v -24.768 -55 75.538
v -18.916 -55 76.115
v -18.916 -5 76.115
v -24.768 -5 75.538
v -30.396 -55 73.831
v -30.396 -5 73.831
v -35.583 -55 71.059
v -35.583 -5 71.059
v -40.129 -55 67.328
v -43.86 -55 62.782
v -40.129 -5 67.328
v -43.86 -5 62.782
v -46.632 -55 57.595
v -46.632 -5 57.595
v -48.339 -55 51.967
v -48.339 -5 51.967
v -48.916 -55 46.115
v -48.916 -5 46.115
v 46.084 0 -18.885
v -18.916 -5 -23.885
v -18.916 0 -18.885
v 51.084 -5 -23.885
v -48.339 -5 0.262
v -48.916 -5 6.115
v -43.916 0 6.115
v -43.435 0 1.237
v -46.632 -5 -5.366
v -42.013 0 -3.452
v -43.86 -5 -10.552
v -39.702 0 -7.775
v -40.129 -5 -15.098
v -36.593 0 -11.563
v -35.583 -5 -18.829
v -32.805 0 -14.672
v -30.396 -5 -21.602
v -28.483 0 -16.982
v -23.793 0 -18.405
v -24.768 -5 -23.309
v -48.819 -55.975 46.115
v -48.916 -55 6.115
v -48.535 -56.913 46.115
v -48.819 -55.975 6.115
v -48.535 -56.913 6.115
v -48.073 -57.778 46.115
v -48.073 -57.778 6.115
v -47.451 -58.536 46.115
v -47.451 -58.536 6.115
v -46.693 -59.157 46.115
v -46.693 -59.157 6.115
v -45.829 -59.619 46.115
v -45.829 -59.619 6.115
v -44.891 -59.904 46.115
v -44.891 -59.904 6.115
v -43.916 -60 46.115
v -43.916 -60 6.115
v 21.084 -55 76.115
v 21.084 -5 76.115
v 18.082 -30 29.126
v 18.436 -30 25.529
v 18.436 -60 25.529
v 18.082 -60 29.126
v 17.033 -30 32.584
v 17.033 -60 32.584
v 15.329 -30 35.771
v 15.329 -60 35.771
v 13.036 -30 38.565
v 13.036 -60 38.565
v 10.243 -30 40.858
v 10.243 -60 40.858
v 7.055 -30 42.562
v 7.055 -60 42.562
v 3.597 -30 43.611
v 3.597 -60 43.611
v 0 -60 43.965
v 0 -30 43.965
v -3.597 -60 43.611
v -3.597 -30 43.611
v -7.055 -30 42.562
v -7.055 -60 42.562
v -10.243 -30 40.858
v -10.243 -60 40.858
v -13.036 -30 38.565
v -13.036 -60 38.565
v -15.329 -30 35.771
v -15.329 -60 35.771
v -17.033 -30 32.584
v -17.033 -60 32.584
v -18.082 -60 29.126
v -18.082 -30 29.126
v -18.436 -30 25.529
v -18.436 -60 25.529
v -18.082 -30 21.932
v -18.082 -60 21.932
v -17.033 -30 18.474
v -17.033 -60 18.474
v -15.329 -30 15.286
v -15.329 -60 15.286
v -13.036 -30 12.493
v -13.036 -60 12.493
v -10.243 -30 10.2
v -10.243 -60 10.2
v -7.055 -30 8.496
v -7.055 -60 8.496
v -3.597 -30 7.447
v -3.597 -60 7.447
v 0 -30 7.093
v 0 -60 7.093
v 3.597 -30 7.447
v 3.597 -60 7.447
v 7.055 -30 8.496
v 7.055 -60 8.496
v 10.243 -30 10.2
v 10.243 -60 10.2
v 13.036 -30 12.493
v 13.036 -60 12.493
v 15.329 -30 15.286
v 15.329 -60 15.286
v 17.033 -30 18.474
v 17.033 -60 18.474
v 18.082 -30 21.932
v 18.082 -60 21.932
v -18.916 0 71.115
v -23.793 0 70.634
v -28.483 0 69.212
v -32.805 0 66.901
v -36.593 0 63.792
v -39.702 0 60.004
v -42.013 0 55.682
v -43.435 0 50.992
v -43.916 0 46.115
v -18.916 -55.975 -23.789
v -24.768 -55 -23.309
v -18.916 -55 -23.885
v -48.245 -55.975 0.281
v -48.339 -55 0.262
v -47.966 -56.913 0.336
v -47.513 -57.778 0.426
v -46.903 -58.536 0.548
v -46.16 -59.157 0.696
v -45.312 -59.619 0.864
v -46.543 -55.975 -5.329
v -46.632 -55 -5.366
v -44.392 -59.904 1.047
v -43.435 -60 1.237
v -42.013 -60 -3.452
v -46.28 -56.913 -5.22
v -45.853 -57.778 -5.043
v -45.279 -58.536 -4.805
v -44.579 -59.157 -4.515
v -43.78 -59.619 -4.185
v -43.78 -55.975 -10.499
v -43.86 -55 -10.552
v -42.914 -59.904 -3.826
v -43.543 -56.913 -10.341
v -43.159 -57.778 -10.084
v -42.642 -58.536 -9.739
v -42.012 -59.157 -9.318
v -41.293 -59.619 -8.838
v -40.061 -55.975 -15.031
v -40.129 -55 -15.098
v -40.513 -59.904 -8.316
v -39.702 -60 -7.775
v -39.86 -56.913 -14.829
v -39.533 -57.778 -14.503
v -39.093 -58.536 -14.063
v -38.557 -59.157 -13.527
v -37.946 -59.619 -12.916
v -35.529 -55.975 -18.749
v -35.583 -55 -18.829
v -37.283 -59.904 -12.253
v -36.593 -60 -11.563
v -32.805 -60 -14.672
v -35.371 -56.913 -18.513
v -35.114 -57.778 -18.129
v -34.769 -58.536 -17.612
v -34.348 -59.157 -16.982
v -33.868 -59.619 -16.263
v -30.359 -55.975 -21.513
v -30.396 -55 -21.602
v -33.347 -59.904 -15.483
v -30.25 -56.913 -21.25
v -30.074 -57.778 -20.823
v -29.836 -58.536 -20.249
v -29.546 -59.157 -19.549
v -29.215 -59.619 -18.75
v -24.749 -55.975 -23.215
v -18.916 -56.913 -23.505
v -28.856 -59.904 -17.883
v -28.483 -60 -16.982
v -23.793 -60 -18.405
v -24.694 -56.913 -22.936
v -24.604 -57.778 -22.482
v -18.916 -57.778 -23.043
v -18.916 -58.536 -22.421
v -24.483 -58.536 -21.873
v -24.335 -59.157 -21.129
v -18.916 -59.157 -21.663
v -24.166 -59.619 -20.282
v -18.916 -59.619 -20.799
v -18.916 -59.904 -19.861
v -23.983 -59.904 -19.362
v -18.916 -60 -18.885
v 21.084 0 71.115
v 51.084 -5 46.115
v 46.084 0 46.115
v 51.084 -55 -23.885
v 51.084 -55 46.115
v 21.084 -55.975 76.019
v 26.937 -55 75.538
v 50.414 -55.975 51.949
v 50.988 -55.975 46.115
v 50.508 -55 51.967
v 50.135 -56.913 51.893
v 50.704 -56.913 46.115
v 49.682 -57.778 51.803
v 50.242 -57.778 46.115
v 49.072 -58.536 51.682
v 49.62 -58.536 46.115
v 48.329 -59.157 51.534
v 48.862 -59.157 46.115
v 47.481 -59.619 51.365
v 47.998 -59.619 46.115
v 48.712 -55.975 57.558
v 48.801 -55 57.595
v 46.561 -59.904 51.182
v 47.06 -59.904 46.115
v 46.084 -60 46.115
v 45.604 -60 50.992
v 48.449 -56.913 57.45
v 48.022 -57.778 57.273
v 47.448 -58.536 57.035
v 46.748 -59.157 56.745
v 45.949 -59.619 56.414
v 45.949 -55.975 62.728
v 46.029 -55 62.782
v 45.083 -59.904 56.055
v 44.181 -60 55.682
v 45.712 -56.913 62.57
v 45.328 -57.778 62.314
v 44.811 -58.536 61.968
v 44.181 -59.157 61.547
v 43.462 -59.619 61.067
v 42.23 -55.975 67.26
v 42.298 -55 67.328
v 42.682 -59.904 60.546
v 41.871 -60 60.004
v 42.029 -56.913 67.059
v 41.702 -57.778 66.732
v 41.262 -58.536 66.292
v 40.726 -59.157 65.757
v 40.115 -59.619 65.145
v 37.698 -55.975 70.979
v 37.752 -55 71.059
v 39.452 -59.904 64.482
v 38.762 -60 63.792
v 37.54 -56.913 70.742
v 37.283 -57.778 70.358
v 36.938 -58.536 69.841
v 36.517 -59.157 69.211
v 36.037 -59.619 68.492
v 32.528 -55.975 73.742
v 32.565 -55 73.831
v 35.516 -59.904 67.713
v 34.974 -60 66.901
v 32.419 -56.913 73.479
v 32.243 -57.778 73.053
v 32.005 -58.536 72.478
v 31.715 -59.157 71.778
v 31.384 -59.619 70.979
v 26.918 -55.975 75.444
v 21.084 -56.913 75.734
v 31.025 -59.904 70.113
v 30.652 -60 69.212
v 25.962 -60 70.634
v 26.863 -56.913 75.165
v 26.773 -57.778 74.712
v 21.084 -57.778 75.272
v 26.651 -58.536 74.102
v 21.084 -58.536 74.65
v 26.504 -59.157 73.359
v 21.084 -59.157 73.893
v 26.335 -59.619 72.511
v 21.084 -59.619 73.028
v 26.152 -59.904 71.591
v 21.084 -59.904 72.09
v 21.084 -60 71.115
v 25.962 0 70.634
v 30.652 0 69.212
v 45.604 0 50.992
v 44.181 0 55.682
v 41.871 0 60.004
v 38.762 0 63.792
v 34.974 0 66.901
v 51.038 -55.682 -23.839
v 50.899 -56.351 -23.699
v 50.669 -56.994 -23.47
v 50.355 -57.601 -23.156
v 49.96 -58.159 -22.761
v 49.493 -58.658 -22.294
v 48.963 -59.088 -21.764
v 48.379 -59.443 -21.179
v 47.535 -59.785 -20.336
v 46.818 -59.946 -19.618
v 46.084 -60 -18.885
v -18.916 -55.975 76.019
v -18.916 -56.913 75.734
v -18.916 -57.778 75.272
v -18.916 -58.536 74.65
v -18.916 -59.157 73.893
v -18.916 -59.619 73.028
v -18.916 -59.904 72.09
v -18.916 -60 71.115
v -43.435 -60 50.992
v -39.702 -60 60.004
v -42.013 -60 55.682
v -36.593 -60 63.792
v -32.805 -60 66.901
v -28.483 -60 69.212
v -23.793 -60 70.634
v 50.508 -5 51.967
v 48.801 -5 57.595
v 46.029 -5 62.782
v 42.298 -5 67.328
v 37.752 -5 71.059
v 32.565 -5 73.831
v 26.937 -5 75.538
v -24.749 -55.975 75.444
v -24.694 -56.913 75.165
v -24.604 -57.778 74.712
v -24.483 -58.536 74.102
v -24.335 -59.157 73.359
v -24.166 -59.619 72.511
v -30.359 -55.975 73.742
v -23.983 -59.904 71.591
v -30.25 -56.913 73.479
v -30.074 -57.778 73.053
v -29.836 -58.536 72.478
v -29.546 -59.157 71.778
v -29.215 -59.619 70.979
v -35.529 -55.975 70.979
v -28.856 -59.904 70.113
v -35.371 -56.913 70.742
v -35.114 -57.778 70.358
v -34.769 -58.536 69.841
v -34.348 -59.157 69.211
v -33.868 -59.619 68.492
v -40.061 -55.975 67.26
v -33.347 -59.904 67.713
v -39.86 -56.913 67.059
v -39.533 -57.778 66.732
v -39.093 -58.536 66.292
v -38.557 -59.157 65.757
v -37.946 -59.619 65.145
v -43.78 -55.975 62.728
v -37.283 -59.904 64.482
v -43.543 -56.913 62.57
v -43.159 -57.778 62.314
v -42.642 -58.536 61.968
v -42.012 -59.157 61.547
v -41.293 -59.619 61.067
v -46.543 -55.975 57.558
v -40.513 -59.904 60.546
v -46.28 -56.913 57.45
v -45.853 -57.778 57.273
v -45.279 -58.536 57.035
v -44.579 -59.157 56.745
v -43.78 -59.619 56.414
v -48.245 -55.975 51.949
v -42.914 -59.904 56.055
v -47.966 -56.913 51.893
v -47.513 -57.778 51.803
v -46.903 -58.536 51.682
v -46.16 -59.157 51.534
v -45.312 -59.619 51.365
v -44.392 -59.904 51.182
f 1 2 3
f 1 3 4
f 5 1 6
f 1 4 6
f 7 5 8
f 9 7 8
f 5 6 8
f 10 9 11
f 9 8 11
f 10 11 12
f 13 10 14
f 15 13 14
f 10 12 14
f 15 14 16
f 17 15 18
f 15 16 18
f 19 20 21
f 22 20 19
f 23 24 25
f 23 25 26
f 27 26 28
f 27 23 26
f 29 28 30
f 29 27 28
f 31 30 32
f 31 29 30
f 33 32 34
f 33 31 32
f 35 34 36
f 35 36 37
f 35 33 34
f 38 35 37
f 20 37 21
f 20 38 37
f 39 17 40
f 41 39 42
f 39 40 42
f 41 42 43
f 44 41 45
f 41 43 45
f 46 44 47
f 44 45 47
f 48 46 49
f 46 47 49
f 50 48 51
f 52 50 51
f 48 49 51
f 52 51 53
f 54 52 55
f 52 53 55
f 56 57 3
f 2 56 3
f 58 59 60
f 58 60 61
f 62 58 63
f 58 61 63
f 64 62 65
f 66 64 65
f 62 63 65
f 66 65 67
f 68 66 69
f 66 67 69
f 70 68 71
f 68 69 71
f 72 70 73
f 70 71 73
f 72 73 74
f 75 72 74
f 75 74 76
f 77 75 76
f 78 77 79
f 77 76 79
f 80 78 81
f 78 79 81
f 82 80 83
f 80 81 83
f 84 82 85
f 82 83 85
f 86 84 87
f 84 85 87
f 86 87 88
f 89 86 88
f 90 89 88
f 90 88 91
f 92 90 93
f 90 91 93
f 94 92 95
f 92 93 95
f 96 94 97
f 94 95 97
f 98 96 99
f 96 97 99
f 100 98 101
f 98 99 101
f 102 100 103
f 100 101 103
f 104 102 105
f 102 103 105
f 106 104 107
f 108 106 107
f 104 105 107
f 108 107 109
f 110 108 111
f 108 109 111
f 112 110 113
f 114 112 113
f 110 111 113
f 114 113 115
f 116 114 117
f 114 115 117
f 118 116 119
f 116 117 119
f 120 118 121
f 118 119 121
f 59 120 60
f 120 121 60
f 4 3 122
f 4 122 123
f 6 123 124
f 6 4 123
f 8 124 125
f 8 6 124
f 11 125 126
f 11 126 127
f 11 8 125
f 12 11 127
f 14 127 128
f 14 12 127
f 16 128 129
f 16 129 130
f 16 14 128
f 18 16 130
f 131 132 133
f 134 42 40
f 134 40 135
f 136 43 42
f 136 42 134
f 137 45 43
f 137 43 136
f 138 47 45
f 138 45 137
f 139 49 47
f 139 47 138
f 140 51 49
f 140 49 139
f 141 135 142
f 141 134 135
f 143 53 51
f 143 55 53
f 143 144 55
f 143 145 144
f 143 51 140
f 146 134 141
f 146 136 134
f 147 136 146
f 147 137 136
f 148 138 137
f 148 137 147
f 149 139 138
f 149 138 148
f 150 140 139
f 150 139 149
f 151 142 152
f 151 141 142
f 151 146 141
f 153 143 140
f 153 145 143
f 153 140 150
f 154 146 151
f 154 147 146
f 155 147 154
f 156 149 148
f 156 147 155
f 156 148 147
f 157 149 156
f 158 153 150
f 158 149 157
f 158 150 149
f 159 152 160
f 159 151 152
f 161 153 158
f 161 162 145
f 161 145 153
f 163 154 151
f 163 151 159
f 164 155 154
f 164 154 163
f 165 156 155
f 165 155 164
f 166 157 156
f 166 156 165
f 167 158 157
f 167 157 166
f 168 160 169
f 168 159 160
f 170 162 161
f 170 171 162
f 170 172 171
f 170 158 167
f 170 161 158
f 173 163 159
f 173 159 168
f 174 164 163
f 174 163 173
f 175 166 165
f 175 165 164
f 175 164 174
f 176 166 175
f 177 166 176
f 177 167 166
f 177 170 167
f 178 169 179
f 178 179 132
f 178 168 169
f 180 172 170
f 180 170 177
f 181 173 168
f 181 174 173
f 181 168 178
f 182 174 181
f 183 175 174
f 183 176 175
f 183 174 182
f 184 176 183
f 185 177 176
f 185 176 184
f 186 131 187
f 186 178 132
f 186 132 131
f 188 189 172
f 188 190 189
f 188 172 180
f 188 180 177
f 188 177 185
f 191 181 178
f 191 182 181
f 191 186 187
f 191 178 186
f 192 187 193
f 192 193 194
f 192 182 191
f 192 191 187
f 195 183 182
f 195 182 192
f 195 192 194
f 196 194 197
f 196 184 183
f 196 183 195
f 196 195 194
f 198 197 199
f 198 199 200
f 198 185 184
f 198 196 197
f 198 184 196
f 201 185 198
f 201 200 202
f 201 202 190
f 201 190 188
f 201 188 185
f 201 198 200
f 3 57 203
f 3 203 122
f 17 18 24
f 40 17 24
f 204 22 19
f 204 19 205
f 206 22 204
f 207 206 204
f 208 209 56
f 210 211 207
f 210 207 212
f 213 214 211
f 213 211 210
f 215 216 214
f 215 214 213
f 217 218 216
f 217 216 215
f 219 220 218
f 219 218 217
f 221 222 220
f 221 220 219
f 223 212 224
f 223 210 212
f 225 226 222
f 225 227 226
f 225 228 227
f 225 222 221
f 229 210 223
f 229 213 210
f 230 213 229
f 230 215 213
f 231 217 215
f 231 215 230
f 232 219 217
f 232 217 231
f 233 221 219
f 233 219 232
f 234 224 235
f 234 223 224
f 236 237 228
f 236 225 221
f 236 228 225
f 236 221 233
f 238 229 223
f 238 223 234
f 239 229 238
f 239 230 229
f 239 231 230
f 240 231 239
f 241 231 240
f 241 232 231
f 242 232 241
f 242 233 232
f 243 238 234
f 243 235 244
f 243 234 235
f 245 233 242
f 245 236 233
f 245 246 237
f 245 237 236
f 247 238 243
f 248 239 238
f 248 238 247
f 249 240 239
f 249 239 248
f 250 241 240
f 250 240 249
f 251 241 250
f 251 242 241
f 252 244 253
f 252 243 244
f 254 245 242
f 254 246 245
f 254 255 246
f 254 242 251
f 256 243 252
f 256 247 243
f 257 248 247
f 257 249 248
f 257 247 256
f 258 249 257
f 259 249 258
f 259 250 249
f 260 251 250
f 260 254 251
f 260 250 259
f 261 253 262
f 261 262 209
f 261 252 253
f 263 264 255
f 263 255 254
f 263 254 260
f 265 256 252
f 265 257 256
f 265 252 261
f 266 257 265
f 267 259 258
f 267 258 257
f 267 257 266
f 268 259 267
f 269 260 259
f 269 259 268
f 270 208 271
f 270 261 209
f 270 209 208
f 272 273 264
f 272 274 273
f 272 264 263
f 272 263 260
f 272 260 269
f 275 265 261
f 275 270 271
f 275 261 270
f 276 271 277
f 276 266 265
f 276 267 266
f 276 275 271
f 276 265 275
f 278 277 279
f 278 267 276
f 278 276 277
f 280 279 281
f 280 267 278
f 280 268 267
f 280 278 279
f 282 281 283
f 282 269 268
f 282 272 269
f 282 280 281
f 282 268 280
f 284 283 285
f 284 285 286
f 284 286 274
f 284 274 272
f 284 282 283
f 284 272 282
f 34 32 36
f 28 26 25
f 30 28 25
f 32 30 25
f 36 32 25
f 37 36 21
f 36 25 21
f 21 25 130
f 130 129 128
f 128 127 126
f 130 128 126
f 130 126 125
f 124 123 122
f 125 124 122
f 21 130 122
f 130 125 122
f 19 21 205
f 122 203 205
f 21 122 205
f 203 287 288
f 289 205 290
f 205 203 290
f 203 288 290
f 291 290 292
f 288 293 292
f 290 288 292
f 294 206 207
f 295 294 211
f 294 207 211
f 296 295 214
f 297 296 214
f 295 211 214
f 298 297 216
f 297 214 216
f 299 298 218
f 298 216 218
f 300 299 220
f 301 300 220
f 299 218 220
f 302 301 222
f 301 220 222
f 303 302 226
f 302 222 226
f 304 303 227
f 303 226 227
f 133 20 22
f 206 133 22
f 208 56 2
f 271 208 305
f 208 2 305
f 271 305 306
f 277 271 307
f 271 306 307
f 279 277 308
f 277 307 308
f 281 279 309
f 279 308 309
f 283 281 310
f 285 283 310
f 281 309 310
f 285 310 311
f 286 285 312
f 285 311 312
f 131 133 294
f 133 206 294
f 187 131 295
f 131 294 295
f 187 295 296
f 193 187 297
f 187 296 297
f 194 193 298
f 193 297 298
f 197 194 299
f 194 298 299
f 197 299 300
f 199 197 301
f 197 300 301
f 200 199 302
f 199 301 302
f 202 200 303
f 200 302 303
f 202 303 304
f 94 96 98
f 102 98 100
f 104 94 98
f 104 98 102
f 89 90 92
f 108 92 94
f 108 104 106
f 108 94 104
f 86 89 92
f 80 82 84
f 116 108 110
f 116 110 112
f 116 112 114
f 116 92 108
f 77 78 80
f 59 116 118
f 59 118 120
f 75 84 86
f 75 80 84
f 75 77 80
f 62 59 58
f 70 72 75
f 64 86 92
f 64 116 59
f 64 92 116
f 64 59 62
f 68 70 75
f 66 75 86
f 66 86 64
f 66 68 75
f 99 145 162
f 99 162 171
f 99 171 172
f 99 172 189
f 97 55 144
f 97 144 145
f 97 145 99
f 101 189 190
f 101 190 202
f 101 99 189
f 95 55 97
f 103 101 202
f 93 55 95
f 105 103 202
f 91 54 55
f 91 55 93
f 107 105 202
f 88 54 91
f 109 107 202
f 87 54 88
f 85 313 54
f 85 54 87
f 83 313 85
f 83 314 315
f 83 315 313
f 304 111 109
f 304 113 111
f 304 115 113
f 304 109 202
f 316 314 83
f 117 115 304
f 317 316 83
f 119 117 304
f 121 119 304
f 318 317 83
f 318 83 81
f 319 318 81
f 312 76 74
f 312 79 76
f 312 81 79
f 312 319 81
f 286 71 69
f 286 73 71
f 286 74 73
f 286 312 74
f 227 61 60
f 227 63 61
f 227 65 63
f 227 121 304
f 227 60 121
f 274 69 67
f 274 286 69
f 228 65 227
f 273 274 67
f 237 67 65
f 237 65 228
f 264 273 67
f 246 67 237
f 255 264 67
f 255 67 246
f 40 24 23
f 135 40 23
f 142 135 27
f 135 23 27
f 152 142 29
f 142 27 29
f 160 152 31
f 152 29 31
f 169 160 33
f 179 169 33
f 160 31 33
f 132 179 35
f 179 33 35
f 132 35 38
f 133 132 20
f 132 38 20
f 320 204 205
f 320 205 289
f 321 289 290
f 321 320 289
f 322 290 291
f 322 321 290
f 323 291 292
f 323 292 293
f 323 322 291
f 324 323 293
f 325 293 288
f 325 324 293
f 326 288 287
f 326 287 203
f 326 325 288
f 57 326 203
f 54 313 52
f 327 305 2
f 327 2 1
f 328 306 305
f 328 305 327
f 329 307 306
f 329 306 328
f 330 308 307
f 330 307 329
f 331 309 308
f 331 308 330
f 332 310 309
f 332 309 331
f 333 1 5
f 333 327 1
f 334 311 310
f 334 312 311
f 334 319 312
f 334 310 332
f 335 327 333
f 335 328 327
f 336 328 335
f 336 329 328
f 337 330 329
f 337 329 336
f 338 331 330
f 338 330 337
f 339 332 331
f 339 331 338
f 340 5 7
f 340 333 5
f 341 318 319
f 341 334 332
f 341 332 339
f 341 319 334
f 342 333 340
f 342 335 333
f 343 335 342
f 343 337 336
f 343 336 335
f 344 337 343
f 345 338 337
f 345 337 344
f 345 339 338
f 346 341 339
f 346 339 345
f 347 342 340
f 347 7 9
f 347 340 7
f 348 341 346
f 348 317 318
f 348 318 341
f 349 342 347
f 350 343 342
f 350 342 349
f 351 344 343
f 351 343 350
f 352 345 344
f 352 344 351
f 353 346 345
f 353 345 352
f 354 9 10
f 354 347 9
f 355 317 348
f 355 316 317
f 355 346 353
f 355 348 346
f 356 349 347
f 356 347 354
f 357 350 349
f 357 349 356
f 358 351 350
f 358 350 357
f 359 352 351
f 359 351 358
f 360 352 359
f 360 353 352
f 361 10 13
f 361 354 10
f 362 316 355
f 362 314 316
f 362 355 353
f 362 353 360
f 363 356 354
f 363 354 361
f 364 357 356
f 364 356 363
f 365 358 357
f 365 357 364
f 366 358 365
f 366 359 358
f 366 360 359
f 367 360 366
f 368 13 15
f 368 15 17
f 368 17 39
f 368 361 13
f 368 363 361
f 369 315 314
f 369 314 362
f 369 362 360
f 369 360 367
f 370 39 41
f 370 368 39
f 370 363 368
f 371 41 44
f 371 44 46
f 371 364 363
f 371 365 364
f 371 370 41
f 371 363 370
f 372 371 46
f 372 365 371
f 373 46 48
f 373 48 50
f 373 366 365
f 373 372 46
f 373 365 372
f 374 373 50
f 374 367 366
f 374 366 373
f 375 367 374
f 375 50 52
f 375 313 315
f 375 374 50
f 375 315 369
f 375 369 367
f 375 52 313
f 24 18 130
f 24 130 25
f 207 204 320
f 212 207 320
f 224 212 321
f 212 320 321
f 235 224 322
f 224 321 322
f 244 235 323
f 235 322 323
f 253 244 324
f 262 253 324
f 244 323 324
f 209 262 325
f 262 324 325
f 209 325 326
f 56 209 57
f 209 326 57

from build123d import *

# Parameters (mm, degrees)
F1_DEPTH = 60
F2_R     = 5
F3_SIZE  = 5
F4_R     = 18.436083
F5_DEPTH = 30


with BuildPart() as f1:
    # F0 (on Front) → F1 (new body)
    with BuildSketch(Plane.XZ):
        with BuildLine():
            Line((21.084471, 76.11473), (-18.915529, 76.11473))
            ThreePointArc((-18.915529, 76.11473), (-40.128732, 67.327933), (-48.915529, 46.11473))
            Line((-48.915529, 46.11473), (-48.915529, 6.11473))
            ThreePointArc((-48.915529, 6.11473), (-40.128732, -15.098474), (-18.915529, -23.88527))
            Line((-18.915529, -23.88527), (51.084471, -23.88527))
            Line((51.084471, -23.88527), (51.084471, 46.11473))
            ThreePointArc((51.084471, 46.11473), (42.297675, 67.327933), (21.084471, 76.11473))
        make_face()
    extrude(amount=F1_DEPTH)

    # F2
    f2_edges = [f1.edges().sort_by_distance(p)[0] for p in [
        (51.084471, -60, 11.11473),
        (42.297675, -60, 67.327933),
        (1.084471, -60, 76.11473),
        (-40.128732, -60, 67.327933),
        (-48.915529, -60, 26.11473),
        (-40.128732, -60, -15.098474),
        (16.084471, -60, -23.88527),
    ]]
    fillet(f2_edges, radius=F2_R)

    # F3
    f3_edges = [f1.edges().sort_by_distance(p)[0] for p in [
        (51.084471, 0, 11.11473),
        (42.297675, 0, 67.327933),
        (1.084471, 0, 76.11473),
        (-40.128732, 0, 67.327933),
        (-48.915529, 0, 26.11473),
        (-40.128732, 0, -15.098474),
        (16.084471, 0, -23.88527),
    ]]
    chamfer(f3_edges, length=F3_SIZE)

    # F4 (on face) → F5 (cut)
    with BuildSketch(Plane.XZ.offset(60)):
        with Locations((0, 25.528846)):
            Circle(F4_R)
    extrude(amount=-F5_DEPTH, mode=Mode.SUBTRACT)


solid = f1.part
